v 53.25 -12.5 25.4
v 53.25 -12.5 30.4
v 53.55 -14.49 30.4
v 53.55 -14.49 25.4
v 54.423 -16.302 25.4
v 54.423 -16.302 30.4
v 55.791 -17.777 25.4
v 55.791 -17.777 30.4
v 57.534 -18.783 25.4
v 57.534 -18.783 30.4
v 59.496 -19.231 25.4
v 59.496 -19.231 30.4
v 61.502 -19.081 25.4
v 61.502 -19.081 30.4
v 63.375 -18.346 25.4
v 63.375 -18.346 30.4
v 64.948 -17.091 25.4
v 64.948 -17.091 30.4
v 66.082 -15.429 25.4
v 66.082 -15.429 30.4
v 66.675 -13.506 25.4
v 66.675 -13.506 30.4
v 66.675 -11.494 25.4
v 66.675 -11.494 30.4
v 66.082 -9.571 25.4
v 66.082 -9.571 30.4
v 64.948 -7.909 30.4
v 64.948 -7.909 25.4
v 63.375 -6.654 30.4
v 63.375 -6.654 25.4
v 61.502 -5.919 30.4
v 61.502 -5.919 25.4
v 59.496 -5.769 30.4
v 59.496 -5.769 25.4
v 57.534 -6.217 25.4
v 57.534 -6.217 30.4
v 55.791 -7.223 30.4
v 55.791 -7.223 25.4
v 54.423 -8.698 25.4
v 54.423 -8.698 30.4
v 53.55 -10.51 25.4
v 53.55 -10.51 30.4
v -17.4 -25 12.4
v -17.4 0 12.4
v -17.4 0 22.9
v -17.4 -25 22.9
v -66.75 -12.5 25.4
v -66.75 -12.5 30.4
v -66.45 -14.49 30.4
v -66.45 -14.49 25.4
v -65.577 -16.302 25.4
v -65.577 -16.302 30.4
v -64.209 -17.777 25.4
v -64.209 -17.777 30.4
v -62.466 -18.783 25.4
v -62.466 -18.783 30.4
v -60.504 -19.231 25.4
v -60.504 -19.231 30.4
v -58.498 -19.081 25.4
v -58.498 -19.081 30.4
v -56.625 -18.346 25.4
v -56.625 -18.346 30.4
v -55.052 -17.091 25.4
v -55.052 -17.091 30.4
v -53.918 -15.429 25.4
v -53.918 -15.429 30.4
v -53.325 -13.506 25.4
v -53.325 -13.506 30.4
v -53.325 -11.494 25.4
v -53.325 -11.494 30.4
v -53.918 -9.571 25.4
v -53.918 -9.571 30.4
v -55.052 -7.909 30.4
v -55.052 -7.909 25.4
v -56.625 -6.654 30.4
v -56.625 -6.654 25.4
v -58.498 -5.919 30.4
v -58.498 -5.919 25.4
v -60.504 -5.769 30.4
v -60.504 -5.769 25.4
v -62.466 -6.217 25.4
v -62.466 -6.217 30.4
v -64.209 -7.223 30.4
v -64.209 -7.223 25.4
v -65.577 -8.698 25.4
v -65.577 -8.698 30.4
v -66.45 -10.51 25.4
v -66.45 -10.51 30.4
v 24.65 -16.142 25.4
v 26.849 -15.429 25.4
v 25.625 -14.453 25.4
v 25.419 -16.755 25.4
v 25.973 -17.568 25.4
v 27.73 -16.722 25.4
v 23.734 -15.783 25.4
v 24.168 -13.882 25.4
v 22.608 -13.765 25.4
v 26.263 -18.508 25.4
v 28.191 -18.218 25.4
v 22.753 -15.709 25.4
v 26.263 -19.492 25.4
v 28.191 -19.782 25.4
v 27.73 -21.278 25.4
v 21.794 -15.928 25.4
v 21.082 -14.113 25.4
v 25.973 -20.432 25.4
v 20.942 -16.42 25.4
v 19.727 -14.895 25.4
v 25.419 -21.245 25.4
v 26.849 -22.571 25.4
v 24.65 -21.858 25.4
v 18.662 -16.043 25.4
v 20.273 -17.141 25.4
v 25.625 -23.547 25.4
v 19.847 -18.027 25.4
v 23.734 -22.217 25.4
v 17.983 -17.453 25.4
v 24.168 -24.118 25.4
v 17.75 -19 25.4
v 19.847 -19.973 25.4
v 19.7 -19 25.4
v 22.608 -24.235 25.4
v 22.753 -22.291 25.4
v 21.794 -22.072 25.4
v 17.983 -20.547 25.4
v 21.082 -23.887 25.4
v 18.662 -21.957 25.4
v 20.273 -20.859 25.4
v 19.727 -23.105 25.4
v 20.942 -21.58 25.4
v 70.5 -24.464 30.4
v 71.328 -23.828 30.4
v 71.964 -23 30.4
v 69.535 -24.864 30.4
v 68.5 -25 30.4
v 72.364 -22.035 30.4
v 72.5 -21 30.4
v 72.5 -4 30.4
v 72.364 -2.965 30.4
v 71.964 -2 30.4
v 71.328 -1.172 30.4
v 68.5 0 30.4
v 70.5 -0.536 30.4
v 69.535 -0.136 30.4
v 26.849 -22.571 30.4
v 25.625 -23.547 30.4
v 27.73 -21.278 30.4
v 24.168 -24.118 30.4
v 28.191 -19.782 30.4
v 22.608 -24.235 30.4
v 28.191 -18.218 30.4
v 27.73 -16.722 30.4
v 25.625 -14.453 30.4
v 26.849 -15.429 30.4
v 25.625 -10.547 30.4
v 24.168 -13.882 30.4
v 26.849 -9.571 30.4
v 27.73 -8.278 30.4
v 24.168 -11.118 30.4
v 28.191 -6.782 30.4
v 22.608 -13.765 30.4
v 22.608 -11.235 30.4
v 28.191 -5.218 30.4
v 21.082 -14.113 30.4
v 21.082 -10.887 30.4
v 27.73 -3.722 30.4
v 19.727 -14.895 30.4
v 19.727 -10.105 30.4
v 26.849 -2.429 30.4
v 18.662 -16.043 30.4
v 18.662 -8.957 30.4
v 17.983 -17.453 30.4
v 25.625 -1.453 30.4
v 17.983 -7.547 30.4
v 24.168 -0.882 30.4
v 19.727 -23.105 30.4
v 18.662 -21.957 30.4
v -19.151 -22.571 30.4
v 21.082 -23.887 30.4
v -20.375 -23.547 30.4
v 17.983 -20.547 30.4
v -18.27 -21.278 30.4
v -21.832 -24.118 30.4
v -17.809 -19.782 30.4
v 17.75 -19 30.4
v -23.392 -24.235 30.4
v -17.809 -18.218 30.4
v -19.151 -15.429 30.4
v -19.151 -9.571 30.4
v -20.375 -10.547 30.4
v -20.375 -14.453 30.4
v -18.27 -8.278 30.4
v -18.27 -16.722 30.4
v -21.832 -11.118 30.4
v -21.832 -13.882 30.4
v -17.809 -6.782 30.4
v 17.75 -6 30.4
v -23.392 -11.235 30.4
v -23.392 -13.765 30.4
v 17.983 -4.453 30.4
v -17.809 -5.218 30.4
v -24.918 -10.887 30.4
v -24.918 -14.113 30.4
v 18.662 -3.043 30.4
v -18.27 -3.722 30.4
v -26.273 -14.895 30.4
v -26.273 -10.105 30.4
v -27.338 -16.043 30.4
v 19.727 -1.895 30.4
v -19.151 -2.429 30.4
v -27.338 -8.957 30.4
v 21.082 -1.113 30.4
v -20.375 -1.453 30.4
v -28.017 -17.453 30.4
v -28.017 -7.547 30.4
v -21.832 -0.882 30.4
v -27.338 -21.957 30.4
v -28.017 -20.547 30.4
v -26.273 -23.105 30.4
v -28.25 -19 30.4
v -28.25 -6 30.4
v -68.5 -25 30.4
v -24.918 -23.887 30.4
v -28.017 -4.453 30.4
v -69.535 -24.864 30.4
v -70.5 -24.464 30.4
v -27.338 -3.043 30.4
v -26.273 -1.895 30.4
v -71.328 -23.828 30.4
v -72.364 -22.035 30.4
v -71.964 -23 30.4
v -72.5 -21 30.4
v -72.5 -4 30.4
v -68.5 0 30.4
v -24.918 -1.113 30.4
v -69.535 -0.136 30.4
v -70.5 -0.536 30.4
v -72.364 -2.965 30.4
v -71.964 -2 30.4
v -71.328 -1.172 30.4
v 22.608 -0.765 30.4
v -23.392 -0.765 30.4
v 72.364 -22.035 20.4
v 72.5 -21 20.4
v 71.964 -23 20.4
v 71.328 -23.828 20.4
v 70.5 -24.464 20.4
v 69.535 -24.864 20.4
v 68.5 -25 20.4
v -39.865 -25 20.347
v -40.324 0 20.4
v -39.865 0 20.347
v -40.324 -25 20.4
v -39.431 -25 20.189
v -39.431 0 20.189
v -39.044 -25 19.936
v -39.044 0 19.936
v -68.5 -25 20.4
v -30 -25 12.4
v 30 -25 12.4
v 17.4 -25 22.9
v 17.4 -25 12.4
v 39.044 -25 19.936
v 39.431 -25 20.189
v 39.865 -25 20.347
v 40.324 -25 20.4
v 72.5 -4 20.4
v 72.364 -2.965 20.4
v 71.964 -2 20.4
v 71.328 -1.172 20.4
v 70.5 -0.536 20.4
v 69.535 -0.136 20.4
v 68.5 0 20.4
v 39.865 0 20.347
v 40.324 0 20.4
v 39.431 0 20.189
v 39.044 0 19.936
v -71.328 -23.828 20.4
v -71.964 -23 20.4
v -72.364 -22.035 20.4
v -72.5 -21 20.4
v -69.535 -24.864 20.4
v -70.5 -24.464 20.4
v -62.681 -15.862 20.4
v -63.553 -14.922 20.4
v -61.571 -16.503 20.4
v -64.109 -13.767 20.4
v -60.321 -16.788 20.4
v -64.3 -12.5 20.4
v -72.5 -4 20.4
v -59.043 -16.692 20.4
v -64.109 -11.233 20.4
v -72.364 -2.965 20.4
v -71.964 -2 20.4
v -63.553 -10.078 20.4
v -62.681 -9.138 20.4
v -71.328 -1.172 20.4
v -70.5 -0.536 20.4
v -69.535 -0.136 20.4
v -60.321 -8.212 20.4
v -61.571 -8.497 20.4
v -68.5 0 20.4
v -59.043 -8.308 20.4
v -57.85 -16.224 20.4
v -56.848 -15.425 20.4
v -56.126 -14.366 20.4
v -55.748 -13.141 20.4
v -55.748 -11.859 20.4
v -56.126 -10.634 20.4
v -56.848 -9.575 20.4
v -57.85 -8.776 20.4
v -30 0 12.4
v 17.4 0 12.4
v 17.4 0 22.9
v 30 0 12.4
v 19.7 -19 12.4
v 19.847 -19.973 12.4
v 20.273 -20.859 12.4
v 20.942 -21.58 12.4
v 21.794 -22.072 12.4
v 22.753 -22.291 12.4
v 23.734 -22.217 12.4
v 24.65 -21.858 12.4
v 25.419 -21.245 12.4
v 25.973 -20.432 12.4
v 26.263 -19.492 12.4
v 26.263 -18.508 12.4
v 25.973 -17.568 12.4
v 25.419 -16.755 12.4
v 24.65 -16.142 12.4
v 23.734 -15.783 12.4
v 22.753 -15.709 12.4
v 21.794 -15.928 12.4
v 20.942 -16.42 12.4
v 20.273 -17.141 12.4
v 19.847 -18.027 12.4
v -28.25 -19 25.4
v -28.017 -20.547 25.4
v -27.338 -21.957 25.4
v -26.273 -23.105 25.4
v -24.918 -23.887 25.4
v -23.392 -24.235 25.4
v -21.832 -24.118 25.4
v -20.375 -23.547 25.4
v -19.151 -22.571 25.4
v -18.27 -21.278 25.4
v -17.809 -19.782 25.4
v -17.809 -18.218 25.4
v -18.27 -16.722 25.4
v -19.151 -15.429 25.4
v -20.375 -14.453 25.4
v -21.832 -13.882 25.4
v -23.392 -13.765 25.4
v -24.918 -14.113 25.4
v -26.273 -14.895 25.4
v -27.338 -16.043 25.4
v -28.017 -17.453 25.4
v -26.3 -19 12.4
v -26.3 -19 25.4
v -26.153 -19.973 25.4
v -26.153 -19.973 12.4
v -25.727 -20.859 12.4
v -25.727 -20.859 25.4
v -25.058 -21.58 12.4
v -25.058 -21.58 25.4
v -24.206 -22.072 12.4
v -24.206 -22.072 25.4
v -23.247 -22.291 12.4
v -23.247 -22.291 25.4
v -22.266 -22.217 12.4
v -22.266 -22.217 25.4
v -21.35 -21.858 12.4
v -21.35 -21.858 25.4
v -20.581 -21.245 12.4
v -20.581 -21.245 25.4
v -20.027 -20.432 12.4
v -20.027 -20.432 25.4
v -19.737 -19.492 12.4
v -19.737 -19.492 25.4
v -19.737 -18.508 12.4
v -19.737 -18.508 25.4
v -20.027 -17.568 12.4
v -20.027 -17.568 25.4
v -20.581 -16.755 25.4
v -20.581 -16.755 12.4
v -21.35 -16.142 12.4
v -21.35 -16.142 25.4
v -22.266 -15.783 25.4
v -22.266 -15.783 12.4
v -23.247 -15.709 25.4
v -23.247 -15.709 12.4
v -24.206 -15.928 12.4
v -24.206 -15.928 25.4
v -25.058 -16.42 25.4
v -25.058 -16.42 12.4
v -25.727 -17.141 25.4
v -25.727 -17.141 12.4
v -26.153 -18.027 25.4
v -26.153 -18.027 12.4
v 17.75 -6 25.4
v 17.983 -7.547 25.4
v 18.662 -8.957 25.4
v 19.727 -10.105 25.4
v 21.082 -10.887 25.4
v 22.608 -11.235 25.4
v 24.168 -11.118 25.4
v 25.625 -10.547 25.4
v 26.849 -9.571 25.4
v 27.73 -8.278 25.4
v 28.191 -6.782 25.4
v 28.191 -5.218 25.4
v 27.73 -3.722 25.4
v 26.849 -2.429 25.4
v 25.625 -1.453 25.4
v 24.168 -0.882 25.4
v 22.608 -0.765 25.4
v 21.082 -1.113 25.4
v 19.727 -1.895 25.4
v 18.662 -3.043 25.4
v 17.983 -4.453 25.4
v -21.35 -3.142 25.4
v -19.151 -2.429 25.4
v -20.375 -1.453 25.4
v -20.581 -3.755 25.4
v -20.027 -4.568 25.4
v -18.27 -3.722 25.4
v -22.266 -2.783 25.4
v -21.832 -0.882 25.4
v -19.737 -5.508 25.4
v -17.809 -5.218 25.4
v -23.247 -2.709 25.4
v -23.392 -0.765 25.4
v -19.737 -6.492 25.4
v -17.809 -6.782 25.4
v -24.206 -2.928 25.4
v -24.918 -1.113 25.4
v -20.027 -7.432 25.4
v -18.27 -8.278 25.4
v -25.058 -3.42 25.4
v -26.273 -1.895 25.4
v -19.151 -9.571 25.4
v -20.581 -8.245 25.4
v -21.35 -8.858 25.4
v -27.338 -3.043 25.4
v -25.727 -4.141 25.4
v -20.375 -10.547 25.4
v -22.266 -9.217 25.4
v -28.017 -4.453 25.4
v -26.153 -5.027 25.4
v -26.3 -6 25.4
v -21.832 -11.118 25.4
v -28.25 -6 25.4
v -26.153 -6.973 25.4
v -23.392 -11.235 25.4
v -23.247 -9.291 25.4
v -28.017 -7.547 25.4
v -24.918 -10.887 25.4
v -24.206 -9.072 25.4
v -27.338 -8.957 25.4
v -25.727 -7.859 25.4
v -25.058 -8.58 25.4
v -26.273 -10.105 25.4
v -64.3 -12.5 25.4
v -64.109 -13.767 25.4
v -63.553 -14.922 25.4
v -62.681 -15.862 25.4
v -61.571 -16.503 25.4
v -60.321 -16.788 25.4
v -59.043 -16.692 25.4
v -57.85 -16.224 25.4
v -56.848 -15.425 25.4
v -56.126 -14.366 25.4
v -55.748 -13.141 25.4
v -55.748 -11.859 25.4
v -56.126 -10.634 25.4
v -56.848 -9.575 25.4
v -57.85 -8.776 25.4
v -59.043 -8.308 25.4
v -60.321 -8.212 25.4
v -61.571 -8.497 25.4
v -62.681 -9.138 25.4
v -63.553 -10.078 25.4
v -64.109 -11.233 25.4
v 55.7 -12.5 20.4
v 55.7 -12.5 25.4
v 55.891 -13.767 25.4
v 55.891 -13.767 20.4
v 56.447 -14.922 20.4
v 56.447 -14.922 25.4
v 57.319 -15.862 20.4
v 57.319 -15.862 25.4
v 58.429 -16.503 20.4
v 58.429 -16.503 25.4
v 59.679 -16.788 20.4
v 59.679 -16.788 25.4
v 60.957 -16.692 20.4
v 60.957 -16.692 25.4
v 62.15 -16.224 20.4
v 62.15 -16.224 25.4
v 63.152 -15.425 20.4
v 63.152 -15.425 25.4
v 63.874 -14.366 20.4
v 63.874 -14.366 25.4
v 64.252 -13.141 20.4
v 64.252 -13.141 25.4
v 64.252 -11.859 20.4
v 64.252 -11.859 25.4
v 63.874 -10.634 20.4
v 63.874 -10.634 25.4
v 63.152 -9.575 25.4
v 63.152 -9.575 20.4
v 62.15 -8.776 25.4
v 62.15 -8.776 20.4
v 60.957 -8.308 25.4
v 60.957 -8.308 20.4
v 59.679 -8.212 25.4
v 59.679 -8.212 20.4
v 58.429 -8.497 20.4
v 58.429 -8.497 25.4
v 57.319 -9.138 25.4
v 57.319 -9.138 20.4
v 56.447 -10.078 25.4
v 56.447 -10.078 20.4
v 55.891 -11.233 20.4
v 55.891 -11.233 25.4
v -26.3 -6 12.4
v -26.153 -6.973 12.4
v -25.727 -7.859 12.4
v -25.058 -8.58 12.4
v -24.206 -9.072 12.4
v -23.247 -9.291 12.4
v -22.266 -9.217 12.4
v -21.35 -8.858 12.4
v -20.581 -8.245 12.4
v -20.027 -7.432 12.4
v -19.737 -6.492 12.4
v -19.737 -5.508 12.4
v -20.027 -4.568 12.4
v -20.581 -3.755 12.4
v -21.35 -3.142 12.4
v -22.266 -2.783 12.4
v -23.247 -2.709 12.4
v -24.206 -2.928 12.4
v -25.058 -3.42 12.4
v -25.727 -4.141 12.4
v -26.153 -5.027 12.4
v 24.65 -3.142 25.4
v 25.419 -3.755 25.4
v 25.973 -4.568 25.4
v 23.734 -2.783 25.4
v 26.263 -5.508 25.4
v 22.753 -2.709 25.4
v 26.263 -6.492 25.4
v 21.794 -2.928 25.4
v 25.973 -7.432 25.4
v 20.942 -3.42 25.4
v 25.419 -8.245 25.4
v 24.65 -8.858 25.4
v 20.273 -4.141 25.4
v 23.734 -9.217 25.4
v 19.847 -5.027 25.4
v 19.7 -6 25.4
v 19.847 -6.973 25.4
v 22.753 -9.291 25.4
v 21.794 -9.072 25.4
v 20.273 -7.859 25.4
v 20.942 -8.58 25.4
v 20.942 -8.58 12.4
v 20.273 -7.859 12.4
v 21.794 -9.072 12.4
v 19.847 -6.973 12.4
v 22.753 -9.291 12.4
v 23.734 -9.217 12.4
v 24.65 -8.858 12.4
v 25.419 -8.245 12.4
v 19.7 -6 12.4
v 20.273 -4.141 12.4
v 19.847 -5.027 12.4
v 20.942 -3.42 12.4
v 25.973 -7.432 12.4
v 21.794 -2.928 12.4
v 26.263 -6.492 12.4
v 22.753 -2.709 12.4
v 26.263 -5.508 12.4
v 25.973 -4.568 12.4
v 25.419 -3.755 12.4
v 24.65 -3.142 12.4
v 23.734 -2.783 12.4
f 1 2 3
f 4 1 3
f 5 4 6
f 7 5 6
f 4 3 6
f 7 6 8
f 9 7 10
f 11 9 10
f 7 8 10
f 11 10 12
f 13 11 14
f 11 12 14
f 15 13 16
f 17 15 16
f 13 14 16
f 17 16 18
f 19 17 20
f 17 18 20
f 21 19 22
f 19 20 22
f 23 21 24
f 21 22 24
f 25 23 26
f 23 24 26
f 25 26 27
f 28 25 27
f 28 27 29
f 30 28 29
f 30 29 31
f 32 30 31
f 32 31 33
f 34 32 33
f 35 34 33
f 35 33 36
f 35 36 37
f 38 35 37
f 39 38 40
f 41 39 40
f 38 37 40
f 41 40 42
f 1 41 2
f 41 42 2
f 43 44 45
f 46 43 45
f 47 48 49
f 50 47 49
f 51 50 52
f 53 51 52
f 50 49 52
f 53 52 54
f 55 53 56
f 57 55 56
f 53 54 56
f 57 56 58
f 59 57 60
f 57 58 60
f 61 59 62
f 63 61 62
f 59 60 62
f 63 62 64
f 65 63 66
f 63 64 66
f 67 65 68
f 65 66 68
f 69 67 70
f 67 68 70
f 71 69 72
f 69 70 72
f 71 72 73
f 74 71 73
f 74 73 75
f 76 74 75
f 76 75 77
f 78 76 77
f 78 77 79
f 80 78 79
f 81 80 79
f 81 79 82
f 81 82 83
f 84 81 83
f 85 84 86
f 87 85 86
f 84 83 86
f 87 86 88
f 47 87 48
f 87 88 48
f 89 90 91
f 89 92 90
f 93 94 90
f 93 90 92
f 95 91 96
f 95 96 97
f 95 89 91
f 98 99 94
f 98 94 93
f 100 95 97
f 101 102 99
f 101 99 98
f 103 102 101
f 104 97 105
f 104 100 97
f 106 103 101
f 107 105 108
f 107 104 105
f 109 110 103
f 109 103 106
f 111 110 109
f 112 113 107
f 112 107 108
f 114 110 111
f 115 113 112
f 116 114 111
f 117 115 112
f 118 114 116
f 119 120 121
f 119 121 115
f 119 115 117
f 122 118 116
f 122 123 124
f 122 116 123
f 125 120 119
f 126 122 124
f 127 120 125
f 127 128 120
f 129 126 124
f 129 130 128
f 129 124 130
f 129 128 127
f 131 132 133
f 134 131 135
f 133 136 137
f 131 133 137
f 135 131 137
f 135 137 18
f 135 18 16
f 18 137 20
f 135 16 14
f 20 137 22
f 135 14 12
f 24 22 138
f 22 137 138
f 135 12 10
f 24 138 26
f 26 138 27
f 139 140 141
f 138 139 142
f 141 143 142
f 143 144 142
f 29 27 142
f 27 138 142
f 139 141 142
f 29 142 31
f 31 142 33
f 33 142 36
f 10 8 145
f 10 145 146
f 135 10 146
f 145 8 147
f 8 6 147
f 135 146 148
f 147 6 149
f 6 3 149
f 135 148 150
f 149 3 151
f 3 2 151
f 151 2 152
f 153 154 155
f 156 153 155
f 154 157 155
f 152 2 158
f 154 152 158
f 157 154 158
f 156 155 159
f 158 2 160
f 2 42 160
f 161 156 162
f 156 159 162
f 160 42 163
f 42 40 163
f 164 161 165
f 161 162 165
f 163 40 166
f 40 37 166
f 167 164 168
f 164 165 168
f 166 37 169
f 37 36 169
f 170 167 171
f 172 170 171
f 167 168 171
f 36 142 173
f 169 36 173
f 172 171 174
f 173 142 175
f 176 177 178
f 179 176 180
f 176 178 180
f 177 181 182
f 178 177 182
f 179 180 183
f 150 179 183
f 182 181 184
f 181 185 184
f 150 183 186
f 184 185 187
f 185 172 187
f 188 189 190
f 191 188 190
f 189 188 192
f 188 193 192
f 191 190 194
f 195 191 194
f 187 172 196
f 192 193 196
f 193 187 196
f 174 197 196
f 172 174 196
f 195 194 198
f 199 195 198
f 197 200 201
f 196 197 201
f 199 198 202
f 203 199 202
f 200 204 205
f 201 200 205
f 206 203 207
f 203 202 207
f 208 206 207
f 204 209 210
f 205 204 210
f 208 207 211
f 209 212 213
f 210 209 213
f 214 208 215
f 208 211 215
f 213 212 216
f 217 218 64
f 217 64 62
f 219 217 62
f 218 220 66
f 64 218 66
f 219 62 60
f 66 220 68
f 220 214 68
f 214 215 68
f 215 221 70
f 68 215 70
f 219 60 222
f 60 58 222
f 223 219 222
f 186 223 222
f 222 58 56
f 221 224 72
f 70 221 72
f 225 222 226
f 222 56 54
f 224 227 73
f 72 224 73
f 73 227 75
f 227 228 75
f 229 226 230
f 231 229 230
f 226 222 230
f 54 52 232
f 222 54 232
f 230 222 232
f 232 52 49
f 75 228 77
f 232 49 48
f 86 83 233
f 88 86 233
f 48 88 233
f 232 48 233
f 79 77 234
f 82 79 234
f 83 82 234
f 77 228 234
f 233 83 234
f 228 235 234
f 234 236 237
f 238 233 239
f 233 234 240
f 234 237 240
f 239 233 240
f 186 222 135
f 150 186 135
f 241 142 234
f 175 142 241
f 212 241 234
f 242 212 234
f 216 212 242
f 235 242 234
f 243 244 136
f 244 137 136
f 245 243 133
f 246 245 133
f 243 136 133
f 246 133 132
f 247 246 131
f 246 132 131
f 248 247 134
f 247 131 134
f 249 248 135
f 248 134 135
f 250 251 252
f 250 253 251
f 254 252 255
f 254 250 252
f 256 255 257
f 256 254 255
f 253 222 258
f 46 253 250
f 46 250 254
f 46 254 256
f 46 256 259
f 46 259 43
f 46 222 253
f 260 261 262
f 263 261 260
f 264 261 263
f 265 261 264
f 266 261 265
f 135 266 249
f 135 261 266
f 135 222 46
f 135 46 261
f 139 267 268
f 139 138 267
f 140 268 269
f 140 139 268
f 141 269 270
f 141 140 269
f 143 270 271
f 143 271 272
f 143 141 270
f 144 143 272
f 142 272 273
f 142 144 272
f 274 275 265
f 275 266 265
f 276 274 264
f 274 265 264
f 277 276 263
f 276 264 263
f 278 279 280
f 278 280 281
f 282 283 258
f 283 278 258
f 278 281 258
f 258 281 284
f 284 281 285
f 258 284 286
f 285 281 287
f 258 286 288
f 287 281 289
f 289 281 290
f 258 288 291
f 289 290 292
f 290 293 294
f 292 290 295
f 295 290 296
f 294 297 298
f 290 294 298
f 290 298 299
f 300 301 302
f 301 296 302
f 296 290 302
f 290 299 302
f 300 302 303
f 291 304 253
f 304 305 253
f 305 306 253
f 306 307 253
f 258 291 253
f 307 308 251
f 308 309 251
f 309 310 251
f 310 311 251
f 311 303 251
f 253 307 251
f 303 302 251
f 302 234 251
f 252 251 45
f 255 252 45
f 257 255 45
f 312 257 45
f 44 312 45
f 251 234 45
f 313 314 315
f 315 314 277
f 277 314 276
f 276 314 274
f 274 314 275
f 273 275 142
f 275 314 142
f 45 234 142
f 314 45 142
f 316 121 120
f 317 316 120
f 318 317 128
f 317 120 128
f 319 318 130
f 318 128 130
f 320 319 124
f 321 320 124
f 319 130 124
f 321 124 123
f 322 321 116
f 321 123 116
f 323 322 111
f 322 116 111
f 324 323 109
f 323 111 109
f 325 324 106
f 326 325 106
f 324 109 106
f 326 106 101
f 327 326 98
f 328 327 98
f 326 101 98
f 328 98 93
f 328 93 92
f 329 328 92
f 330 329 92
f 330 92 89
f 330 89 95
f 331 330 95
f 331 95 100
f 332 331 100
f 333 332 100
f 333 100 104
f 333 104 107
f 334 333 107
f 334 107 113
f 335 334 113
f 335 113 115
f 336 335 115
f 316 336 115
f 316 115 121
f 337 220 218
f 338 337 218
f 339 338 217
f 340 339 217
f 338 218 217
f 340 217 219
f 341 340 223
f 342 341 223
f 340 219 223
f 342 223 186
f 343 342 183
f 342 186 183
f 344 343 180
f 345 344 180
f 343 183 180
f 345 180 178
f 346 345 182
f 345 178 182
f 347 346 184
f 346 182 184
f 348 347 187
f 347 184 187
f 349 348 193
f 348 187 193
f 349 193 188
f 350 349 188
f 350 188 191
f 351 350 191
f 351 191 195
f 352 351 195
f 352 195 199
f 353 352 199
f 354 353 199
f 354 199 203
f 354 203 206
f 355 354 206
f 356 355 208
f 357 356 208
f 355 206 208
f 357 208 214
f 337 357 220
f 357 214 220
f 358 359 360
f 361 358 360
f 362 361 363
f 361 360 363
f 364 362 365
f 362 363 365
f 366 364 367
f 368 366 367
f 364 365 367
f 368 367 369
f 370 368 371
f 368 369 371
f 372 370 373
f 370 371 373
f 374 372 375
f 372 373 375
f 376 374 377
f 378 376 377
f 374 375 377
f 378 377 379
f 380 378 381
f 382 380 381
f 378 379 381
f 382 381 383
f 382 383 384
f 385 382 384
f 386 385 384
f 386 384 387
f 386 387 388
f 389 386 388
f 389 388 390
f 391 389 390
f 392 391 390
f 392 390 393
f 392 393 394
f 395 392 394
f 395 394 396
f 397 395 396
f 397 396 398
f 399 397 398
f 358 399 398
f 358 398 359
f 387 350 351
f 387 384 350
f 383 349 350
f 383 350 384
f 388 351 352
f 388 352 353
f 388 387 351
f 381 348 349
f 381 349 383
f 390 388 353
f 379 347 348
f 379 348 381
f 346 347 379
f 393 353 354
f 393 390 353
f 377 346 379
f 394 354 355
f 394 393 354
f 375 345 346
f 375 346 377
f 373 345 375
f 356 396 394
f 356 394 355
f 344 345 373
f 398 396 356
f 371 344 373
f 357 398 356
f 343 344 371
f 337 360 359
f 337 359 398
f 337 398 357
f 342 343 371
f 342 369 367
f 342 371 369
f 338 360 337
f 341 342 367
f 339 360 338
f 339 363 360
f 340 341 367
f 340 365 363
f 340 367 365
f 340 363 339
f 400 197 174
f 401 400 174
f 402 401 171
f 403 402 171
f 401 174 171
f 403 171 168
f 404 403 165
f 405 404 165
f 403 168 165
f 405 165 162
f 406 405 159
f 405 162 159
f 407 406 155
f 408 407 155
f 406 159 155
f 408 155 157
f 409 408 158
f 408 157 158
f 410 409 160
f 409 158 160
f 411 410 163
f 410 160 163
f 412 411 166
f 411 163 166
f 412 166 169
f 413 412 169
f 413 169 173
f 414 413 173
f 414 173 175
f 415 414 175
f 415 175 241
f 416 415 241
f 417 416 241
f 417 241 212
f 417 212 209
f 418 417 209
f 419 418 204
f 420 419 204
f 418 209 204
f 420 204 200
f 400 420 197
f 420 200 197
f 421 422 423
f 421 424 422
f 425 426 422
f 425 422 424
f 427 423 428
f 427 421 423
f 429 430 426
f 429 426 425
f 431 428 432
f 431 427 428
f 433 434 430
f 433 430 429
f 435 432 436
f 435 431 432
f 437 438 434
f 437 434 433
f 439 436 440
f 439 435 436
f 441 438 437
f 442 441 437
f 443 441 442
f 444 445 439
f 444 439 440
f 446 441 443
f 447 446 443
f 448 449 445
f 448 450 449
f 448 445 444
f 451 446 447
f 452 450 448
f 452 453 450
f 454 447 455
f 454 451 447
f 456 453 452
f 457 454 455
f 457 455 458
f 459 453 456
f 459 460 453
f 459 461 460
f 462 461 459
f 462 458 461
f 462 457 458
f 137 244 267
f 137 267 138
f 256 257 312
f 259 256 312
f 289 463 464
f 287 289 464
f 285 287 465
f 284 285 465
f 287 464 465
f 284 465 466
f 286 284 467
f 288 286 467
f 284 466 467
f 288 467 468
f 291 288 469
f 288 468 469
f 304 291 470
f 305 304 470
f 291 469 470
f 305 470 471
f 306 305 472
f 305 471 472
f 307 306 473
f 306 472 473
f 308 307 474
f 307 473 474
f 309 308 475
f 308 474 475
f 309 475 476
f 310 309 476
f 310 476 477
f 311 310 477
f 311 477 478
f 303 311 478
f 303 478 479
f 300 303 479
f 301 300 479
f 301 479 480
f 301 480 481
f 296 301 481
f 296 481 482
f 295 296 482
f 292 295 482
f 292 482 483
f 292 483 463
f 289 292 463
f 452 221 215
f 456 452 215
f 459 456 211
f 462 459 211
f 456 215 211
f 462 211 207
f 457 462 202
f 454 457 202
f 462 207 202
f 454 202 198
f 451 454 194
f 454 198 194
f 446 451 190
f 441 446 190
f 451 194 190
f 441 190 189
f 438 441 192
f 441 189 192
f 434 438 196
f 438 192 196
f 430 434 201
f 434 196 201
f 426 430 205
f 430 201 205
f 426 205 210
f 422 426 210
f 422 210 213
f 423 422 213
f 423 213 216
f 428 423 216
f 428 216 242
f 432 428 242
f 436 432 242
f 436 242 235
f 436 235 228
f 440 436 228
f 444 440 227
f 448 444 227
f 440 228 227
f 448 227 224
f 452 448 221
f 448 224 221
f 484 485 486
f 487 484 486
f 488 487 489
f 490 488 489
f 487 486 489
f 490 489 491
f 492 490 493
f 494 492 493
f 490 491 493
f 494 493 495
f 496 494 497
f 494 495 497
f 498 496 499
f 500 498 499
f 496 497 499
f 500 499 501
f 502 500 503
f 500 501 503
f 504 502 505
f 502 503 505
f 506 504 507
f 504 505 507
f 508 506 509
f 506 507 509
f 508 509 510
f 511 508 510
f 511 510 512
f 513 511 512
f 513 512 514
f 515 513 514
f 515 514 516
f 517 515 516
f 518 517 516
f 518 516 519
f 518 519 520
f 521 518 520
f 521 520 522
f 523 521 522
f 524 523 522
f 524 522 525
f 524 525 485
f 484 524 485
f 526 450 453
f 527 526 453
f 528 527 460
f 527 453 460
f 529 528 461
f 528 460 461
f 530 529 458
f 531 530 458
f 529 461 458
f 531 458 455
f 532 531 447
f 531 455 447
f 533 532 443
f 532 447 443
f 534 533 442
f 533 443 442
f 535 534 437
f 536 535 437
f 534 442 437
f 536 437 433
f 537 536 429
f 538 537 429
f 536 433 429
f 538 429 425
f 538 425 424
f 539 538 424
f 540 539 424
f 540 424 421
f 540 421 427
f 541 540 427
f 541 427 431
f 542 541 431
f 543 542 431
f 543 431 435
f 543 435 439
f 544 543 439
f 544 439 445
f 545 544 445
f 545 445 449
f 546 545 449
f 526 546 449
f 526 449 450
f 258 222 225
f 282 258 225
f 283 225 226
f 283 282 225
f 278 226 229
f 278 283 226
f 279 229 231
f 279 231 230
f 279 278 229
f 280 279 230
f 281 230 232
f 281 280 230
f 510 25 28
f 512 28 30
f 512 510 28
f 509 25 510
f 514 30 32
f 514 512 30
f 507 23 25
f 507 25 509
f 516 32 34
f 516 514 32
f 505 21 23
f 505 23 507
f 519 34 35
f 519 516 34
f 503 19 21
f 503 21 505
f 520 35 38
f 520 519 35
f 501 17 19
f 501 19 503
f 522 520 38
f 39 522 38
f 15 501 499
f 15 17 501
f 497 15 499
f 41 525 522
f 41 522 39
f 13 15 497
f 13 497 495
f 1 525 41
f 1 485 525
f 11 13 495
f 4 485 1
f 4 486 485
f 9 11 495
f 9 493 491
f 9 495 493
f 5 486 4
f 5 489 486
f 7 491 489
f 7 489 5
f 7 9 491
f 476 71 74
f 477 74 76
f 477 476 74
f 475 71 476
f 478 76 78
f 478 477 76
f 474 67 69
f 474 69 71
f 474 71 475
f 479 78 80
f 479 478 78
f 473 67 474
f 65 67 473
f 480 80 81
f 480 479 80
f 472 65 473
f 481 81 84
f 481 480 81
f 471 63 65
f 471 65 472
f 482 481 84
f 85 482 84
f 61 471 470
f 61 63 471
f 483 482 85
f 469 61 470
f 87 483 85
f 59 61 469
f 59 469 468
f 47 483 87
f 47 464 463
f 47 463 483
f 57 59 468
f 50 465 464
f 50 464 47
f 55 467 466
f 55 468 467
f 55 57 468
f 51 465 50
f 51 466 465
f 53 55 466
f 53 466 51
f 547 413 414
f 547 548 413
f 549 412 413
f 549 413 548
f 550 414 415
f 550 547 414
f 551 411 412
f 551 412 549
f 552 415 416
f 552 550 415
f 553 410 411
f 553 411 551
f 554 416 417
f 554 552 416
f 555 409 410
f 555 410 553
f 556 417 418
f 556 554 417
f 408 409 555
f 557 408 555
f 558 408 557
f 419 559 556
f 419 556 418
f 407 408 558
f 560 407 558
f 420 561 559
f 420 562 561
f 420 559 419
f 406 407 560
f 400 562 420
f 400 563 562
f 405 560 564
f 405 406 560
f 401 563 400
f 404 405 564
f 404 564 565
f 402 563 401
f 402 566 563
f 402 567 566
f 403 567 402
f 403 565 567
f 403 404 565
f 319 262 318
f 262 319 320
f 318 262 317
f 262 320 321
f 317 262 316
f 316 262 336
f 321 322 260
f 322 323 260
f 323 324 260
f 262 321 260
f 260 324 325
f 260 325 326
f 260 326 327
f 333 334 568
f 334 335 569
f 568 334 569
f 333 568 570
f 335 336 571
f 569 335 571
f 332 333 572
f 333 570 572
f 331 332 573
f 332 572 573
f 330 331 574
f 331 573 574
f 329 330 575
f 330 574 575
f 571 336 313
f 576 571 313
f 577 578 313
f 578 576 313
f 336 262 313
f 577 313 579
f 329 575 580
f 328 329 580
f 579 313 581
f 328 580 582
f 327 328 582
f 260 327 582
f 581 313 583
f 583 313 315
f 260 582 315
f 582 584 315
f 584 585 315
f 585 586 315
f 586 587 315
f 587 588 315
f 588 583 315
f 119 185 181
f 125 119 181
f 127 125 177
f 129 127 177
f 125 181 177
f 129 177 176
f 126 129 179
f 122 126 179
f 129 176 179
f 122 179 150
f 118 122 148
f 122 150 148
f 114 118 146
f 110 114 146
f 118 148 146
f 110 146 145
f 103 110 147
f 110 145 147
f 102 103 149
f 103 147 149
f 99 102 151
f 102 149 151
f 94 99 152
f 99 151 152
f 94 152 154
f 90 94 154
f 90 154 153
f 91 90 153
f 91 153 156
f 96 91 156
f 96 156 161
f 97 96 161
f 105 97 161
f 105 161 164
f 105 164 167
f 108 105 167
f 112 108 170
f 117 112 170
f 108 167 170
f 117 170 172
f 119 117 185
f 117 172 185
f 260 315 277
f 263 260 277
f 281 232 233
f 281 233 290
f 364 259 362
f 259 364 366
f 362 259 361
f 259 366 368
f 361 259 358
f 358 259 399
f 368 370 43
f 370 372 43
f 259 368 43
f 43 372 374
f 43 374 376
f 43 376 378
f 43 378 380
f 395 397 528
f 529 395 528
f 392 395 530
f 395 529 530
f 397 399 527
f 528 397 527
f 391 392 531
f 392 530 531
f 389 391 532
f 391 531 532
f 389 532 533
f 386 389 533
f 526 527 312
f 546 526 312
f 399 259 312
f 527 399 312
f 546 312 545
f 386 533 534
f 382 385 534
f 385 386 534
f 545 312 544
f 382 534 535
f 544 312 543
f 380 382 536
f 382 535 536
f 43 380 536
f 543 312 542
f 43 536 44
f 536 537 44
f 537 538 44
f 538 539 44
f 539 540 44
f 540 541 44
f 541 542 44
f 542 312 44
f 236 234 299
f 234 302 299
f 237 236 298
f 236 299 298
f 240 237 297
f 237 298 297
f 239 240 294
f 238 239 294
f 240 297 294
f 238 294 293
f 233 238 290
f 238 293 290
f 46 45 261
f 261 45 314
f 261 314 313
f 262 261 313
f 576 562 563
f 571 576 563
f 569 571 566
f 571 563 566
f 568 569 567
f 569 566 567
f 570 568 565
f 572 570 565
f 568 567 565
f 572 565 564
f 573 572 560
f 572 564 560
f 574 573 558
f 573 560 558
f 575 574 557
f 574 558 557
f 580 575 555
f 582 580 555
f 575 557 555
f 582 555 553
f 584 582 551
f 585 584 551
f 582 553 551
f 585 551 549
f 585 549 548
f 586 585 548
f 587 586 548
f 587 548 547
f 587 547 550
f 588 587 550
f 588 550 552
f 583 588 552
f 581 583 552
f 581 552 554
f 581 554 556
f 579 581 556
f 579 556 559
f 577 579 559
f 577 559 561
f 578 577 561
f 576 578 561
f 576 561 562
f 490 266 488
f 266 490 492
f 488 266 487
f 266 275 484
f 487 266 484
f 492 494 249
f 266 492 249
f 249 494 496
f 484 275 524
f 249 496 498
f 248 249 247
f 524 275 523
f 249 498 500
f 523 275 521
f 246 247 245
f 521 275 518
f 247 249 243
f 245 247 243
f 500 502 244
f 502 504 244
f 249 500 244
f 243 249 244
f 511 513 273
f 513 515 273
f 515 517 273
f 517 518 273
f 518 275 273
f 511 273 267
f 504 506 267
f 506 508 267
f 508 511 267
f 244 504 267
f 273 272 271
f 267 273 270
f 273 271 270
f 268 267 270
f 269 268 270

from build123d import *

# Parameters (mm, degrees)
PAD_DEPTH       = 25
SKETCH001_R     = 4.3
POCKET_DEPTH    = 18.001
SKETCH002_R     = 3.3
POCKET001_DEPTH = 18.001
FILLET_R        = 4
FILLET001_R     = 2
SKETCH003_R     = 6.75
POCKET002_DEPTH = 5
SKETCH005_R     = 5.25
POCKET004_DEPTH = 5


with BuildPart() as part:
    # Sketch → Pad (new body)
    with BuildSketch(Plane.XZ):
        Polygon((72.5, 30.4), (-72.5, 30.4), (-72.5, 20.4), (-39.6, 20.4), (-30, 12.4), (-17.4, 12.4), (-17.4, 22.9), (17.4, 22.9), (17.4, 12.4), (30, 12.4), (39.6, 20.4), (72.5, 20.4), align=None)
    extrude(amount=PAD_DEPTH)

    # Sketch001 (on Face10 of Pad) → Pocket (cut, through all)
    with BuildSketch(Plane(origin=(0, 0, 30.4), x_dir=(-1, 0, 0), z_dir=(0, 0, 1))):
        with Locations((-60, 12.5)):
            Circle(SKETCH001_R)
        with Locations((60, 12.5)):
            Circle(SKETCH001_R)
    extrude(amount=-POCKET_DEPTH, mode=Mode.SUBTRACT)

    # Sketch002 (on Face15 of Pocket) → Pocket001 (cut, through all)
    with BuildSketch(Plane(origin=(0, 0, 30.4), x_dir=(-1, 0, 0), z_dir=(0, 0, 1))):
        with Locations((-23, 6)):
            Circle(SKETCH002_R)
        with Locations((-23, 19)):
            Circle(SKETCH002_R)
        with Locations((23, 19)):
            Circle(SKETCH002_R)
        with Locations((23, 6)):
            Circle(SKETCH002_R)
    extrude(amount=-POCKET001_DEPTH, mode=Mode.SUBTRACT)

    # Fillet
    fillet_edges = [part.edges().sort_by_distance(p)[0] for p in [
        (-72.5, -25, 25.4),
        (-72.5, 0, 25.4),
        (72.5, -25, 25.4),
        (72.5, 0, 25.4),
    ]]
    fillet(fillet_edges, radius=FILLET_R)

    # Fillet001
    fillet001_edges = [part.edges().sort_by_distance(p)[0] for p in [
        (39.6, -12.5, 20.4),
        (-39.6, -12.5, 20.4),
    ]]
    fillet(fillet001_edges, radius=FILLET001_R)

    # Sketch003 (on Face13 of Fillet001) → Pocket002 (cut)
    with BuildSketch(Plane(origin=(0, 0, 30.4), x_dir=(-1, 0, 0), z_dir=(0, 0, 1))):
        with Locations((-60, 12.5)):
            Circle(SKETCH003_R)
        with Locations((60, 12.5)):
            Circle(SKETCH003_R)
    extrude(amount=-POCKET002_DEPTH, mode=Mode.SUBTRACT)

    # Sketch005 (on Face13 of Pocket002) → Pocket004 (cut)
    with BuildSketch(Plane(origin=(0, 0, 30.4), x_dir=(-1, 0, 0), z_dir=(0, 0, 1))):
        with Locations((-23, 19)):
            Circle(SKETCH005_R)
        with Locations((-23, 6)):
            Circle(SKETCH005_R)
        with Locations((23, 6)):
            Circle(SKETCH005_R)
        with Locations((23, 19)):
            Circle(SKETCH005_R)
    extrude(amount=-POCKET004_DEPTH, mode=Mode.SUBTRACT)


solid = part.part
